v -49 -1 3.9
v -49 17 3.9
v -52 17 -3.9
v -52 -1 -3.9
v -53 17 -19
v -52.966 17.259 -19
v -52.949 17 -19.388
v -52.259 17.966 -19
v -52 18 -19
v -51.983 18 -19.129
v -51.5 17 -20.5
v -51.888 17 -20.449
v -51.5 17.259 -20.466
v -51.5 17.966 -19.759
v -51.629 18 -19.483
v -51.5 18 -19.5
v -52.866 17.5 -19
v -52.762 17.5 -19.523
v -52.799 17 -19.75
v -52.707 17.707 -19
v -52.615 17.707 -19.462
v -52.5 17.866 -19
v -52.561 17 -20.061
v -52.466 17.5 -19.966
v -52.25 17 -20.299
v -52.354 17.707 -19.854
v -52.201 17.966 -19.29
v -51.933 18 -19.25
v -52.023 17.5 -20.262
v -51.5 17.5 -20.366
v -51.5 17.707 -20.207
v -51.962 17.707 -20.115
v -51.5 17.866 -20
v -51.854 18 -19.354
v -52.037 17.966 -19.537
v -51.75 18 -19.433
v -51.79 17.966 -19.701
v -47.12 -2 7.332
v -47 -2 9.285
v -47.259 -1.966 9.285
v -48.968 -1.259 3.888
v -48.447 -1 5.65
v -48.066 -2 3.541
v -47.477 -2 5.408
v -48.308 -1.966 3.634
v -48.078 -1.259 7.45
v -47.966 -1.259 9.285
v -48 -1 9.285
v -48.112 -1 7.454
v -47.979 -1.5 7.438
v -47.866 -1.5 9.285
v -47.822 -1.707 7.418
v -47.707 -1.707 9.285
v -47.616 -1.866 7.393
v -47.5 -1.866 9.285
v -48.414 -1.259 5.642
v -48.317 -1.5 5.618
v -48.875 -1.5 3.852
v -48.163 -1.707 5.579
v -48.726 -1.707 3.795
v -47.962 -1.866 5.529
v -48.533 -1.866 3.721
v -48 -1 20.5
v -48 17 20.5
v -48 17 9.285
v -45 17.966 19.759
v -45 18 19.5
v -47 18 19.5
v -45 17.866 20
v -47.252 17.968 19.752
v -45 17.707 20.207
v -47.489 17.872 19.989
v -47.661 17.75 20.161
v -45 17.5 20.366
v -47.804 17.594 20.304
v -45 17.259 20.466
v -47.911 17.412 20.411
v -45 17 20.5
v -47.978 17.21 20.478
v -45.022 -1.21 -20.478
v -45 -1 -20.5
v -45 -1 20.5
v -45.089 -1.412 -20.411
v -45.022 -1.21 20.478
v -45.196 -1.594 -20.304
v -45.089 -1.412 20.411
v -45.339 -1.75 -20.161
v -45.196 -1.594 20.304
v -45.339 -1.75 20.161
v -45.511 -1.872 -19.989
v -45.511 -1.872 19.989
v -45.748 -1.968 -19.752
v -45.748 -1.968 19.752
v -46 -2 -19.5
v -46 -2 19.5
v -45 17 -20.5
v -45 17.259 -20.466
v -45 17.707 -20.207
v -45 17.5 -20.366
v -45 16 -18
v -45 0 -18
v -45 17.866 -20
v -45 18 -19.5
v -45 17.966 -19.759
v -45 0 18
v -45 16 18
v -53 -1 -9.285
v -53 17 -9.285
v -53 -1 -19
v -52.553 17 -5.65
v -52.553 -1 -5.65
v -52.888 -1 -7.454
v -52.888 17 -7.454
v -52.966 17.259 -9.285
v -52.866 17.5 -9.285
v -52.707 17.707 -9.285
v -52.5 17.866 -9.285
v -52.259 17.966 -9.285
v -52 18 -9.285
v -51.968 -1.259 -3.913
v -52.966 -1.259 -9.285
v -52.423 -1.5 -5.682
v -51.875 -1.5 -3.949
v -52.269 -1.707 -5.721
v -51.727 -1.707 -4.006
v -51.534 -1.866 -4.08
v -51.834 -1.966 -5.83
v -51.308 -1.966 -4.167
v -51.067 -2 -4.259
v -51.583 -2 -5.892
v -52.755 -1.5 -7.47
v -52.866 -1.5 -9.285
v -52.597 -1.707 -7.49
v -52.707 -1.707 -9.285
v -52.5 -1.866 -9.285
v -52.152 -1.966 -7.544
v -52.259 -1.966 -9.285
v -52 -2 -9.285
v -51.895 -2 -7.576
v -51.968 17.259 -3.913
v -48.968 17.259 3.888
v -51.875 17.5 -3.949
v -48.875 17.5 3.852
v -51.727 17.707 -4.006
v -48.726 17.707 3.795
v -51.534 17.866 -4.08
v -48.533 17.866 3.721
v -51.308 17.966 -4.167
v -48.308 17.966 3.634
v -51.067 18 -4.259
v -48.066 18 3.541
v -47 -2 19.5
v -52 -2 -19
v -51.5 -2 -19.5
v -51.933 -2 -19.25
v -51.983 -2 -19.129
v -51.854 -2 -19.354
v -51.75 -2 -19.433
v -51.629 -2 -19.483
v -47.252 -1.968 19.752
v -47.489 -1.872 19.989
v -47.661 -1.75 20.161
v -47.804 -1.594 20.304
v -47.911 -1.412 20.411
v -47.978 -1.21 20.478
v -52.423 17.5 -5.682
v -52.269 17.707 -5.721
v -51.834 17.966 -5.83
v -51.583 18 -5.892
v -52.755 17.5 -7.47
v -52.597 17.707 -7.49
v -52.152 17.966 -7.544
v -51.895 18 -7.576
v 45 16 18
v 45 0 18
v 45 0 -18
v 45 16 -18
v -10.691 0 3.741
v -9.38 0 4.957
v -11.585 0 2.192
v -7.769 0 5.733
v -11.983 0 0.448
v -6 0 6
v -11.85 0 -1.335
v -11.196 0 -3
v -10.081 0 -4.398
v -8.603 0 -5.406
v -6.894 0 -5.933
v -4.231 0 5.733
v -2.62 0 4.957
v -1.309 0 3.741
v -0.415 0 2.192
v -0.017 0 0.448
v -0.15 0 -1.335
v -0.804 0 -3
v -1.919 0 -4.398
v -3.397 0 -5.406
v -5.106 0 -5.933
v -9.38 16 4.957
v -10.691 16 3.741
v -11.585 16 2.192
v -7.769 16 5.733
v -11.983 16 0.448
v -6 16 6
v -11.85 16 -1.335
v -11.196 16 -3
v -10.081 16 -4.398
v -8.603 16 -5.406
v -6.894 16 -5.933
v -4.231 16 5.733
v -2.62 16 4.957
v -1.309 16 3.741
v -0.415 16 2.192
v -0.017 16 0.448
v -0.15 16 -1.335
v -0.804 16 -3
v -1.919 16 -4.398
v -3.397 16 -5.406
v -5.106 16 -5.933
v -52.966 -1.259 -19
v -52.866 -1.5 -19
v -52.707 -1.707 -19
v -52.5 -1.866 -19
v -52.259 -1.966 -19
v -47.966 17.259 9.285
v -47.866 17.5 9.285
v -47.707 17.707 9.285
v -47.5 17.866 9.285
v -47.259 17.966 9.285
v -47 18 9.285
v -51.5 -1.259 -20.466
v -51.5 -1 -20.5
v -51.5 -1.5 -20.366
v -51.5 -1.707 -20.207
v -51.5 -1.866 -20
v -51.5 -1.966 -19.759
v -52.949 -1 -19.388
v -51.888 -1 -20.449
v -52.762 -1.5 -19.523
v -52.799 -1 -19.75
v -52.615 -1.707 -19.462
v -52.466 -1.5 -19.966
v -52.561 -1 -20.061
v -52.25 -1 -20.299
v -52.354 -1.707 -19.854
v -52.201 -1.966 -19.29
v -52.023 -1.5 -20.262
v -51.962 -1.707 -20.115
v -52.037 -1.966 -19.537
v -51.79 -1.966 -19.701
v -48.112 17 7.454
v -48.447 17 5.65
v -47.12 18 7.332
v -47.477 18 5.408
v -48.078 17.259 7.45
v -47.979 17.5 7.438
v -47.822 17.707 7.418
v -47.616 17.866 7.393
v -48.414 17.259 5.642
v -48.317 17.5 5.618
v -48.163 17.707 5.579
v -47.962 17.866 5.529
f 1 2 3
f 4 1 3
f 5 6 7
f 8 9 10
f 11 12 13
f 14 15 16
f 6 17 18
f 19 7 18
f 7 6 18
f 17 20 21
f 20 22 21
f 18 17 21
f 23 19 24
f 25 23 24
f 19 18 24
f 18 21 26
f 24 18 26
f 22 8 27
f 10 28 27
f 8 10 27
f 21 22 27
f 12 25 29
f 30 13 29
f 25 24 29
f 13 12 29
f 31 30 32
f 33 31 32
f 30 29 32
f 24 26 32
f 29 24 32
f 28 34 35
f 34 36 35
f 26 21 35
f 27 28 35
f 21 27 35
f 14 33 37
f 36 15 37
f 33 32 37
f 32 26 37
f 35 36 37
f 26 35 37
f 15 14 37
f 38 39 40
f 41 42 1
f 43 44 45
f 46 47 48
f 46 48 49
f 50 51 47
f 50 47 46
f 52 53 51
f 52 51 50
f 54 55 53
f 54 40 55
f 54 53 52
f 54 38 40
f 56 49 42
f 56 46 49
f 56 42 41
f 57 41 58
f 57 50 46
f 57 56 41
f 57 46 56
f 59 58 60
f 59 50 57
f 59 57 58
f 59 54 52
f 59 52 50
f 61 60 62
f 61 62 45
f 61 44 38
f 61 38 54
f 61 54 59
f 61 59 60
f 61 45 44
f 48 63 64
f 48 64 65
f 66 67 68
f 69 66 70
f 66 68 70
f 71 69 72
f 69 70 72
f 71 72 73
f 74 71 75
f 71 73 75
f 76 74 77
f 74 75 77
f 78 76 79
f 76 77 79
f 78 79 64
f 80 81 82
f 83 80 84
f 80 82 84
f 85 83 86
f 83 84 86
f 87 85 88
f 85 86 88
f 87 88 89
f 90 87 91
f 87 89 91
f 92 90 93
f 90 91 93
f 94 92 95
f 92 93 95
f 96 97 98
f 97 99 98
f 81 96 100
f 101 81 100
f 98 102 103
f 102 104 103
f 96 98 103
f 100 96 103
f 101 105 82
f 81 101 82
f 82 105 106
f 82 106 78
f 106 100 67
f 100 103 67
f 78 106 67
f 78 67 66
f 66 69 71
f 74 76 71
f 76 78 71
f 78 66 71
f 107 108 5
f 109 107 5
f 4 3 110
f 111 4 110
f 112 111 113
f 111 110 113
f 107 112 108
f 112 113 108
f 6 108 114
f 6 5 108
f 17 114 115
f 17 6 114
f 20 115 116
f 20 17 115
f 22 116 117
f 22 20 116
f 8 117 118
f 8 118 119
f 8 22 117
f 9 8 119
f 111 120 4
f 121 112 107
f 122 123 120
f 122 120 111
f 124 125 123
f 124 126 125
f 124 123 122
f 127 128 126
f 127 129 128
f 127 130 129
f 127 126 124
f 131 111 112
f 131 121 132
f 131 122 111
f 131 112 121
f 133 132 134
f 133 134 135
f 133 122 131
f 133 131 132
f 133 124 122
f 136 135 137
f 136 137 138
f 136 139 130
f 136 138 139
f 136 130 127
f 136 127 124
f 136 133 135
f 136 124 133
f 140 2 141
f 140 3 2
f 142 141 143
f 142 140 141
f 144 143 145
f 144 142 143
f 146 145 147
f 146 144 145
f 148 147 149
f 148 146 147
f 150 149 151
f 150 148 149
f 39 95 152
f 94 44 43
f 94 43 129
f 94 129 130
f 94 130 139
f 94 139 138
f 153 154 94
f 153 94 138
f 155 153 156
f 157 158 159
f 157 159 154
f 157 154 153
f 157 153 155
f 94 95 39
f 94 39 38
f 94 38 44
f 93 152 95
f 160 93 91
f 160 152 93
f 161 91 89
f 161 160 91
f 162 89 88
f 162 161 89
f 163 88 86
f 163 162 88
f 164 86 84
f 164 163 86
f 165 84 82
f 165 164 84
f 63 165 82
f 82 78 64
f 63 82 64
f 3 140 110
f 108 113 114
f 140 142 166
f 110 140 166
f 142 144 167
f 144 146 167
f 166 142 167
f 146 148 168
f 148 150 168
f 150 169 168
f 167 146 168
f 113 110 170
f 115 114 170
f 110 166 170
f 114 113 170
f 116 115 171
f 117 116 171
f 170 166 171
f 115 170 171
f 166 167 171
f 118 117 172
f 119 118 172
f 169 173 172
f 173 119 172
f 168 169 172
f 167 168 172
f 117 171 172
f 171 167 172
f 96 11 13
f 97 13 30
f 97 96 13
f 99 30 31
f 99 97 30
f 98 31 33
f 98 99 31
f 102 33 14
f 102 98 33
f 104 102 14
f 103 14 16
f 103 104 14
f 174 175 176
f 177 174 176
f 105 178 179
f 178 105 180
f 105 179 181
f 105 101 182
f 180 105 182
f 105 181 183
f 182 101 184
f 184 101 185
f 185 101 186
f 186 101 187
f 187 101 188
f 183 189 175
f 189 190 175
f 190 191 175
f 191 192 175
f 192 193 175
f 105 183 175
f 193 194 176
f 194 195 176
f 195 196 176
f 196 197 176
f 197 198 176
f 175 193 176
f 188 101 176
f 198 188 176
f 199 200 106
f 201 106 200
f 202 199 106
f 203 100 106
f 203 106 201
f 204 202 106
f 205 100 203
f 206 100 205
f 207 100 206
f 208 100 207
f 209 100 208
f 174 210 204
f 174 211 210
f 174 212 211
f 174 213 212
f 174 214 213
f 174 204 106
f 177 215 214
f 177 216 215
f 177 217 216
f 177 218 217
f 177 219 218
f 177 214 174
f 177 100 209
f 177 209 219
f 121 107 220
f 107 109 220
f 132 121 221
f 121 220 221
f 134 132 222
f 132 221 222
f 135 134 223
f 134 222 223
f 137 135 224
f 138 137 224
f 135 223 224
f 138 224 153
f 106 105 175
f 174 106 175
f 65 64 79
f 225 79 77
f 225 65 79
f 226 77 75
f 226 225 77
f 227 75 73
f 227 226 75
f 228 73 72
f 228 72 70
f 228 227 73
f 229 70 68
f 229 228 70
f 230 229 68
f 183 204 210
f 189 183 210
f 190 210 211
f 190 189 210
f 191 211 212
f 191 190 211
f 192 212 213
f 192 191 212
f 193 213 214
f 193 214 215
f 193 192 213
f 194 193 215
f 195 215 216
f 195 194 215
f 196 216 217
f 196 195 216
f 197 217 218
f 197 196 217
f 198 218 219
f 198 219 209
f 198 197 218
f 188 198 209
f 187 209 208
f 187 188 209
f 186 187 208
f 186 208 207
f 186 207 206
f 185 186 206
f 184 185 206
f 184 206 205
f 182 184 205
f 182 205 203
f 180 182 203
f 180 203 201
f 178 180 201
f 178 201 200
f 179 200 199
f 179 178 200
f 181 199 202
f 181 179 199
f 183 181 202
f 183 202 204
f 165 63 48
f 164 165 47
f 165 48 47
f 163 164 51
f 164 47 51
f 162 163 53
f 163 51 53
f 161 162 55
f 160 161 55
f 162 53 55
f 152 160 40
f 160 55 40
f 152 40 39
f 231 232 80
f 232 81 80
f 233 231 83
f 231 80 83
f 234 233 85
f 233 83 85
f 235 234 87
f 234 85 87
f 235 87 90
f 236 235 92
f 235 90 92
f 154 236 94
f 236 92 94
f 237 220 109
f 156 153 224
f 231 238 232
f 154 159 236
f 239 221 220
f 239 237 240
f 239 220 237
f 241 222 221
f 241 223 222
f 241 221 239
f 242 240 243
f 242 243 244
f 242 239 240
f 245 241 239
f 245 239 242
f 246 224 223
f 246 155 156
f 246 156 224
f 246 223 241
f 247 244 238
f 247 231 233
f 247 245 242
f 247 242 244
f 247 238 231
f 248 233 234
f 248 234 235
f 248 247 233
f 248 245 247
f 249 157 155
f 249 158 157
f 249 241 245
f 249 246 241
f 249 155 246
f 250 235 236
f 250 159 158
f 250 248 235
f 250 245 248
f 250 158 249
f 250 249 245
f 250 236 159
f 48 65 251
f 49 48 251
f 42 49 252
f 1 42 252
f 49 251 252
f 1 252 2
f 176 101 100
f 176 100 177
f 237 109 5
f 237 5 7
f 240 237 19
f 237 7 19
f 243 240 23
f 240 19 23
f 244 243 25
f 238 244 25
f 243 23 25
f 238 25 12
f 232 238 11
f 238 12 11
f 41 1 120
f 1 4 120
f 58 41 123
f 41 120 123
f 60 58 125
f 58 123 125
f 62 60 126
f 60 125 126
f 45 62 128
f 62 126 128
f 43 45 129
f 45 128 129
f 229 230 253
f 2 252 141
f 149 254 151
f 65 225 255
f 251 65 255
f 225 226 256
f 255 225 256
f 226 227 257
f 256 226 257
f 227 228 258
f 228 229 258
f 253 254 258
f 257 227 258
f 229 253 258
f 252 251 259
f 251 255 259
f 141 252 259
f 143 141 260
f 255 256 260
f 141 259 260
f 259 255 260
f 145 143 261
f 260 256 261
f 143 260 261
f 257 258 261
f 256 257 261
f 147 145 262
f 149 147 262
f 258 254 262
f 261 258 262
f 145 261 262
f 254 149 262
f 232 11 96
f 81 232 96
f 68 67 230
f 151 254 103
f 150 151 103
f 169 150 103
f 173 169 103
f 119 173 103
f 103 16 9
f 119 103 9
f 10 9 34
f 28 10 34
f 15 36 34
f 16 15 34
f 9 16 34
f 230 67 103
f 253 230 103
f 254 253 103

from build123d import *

# Parameters (mm, degrees)
SKETCH_1_W      = 90
SKETCH_1_H      = 36
SKETCH_1_R      = 6
EXTRUDE_1_DEPTH = 16
EXTRUDE_2_DEPTH = 20
FILLET_1_R      = 1
FILLET_2_R      = 1


with BuildPart() as part:
    # Эскиз1 → Бобышка-Вытянуть1 (new body)
    with BuildSketch(Plane(origin=(0, 0, 0), x_dir=(1, 0, 0), z_dir=(0, 1, 0))):
        Rectangle(SKETCH_1_W, SKETCH_1_H)
        with Locations(Location((-6, 0, 0), (0, 0, 270))):
            Circle(SKETCH_1_R, mode=Mode.SUBTRACT)
    extrude(amount=EXTRUDE_1_DEPTH)

    # Эскиз3 → Бобышка-Вытянуть2 (add)
    with BuildSketch(Plane(origin=(0, 18, 0), x_dir=(1, 0, 0), z_dir=(0, 1, 0))):
        with BuildLine():
            Line((-45, 20.5), (-45, -20.5))
            Line((-45, -20.5), (-48, -20.5))
            Line((-48, -20.5), (-48, -9.285164832))
            ThreePointArc((-48, -9.285164832), (-48.252071986, -6.546804135), (-48.999815907, -3.900478642))
            Line((-48.999815907, -3.900478642), (-52.000184093, 3.900478642))
            ThreePointArc((-52.000184093, 3.900478642), (-52.747928014, 6.546804135), (-53, 9.285164832))
            Line((-53, 9.285164832), (-53, 19))
            ThreePointArc((-53, 19), (-52.560660172, 20.060660172), (-51.5, 20.5))
            Line((-51.5, 20.5), (-45, 20.5))
        make_face()
    extrude(amount=-EXTRUDE_2_DEPTH)

    # Скругление1
    fillet_1_edges = [part.edges().sort_by_distance(p)[0] for p in [
        (-48.25, 18, -20.5),
        (-52.560660172, 18, -20.060660172),
        (-53, 18, -14.142582416),
        (-52.747928014, 18, -6.546804135),
        (-50.5, 18, 0),
        (-48.252071986, 18, 6.546804135),
        (-48, 18, 14.892582416),
        (-46.5, 18, 20.5),
    ]]
    fillet(fillet_1_edges, radius=FILLET_1_R)

    # Скругление2
    fillet_2_edges = [part.edges().sort_by_distance(p)[0] for p in [
        (-45, -2, 0),
        (-48.25, -2, -20.5),
        (-46.5, -2, 20.5),
        (-48, -2, 14.892582416),
        (-48.252071986, -2, 6.546804135),
        (-50.5, -2, 0),
        (-52.747928014, -2, -6.546804135),
        (-53, -2, -14.142582416),
        (-52.560660172, -2, -20.060660172),
    ]]
    fillet(fillet_2_edges, radius=FILLET_2_R)


solid = part.part
